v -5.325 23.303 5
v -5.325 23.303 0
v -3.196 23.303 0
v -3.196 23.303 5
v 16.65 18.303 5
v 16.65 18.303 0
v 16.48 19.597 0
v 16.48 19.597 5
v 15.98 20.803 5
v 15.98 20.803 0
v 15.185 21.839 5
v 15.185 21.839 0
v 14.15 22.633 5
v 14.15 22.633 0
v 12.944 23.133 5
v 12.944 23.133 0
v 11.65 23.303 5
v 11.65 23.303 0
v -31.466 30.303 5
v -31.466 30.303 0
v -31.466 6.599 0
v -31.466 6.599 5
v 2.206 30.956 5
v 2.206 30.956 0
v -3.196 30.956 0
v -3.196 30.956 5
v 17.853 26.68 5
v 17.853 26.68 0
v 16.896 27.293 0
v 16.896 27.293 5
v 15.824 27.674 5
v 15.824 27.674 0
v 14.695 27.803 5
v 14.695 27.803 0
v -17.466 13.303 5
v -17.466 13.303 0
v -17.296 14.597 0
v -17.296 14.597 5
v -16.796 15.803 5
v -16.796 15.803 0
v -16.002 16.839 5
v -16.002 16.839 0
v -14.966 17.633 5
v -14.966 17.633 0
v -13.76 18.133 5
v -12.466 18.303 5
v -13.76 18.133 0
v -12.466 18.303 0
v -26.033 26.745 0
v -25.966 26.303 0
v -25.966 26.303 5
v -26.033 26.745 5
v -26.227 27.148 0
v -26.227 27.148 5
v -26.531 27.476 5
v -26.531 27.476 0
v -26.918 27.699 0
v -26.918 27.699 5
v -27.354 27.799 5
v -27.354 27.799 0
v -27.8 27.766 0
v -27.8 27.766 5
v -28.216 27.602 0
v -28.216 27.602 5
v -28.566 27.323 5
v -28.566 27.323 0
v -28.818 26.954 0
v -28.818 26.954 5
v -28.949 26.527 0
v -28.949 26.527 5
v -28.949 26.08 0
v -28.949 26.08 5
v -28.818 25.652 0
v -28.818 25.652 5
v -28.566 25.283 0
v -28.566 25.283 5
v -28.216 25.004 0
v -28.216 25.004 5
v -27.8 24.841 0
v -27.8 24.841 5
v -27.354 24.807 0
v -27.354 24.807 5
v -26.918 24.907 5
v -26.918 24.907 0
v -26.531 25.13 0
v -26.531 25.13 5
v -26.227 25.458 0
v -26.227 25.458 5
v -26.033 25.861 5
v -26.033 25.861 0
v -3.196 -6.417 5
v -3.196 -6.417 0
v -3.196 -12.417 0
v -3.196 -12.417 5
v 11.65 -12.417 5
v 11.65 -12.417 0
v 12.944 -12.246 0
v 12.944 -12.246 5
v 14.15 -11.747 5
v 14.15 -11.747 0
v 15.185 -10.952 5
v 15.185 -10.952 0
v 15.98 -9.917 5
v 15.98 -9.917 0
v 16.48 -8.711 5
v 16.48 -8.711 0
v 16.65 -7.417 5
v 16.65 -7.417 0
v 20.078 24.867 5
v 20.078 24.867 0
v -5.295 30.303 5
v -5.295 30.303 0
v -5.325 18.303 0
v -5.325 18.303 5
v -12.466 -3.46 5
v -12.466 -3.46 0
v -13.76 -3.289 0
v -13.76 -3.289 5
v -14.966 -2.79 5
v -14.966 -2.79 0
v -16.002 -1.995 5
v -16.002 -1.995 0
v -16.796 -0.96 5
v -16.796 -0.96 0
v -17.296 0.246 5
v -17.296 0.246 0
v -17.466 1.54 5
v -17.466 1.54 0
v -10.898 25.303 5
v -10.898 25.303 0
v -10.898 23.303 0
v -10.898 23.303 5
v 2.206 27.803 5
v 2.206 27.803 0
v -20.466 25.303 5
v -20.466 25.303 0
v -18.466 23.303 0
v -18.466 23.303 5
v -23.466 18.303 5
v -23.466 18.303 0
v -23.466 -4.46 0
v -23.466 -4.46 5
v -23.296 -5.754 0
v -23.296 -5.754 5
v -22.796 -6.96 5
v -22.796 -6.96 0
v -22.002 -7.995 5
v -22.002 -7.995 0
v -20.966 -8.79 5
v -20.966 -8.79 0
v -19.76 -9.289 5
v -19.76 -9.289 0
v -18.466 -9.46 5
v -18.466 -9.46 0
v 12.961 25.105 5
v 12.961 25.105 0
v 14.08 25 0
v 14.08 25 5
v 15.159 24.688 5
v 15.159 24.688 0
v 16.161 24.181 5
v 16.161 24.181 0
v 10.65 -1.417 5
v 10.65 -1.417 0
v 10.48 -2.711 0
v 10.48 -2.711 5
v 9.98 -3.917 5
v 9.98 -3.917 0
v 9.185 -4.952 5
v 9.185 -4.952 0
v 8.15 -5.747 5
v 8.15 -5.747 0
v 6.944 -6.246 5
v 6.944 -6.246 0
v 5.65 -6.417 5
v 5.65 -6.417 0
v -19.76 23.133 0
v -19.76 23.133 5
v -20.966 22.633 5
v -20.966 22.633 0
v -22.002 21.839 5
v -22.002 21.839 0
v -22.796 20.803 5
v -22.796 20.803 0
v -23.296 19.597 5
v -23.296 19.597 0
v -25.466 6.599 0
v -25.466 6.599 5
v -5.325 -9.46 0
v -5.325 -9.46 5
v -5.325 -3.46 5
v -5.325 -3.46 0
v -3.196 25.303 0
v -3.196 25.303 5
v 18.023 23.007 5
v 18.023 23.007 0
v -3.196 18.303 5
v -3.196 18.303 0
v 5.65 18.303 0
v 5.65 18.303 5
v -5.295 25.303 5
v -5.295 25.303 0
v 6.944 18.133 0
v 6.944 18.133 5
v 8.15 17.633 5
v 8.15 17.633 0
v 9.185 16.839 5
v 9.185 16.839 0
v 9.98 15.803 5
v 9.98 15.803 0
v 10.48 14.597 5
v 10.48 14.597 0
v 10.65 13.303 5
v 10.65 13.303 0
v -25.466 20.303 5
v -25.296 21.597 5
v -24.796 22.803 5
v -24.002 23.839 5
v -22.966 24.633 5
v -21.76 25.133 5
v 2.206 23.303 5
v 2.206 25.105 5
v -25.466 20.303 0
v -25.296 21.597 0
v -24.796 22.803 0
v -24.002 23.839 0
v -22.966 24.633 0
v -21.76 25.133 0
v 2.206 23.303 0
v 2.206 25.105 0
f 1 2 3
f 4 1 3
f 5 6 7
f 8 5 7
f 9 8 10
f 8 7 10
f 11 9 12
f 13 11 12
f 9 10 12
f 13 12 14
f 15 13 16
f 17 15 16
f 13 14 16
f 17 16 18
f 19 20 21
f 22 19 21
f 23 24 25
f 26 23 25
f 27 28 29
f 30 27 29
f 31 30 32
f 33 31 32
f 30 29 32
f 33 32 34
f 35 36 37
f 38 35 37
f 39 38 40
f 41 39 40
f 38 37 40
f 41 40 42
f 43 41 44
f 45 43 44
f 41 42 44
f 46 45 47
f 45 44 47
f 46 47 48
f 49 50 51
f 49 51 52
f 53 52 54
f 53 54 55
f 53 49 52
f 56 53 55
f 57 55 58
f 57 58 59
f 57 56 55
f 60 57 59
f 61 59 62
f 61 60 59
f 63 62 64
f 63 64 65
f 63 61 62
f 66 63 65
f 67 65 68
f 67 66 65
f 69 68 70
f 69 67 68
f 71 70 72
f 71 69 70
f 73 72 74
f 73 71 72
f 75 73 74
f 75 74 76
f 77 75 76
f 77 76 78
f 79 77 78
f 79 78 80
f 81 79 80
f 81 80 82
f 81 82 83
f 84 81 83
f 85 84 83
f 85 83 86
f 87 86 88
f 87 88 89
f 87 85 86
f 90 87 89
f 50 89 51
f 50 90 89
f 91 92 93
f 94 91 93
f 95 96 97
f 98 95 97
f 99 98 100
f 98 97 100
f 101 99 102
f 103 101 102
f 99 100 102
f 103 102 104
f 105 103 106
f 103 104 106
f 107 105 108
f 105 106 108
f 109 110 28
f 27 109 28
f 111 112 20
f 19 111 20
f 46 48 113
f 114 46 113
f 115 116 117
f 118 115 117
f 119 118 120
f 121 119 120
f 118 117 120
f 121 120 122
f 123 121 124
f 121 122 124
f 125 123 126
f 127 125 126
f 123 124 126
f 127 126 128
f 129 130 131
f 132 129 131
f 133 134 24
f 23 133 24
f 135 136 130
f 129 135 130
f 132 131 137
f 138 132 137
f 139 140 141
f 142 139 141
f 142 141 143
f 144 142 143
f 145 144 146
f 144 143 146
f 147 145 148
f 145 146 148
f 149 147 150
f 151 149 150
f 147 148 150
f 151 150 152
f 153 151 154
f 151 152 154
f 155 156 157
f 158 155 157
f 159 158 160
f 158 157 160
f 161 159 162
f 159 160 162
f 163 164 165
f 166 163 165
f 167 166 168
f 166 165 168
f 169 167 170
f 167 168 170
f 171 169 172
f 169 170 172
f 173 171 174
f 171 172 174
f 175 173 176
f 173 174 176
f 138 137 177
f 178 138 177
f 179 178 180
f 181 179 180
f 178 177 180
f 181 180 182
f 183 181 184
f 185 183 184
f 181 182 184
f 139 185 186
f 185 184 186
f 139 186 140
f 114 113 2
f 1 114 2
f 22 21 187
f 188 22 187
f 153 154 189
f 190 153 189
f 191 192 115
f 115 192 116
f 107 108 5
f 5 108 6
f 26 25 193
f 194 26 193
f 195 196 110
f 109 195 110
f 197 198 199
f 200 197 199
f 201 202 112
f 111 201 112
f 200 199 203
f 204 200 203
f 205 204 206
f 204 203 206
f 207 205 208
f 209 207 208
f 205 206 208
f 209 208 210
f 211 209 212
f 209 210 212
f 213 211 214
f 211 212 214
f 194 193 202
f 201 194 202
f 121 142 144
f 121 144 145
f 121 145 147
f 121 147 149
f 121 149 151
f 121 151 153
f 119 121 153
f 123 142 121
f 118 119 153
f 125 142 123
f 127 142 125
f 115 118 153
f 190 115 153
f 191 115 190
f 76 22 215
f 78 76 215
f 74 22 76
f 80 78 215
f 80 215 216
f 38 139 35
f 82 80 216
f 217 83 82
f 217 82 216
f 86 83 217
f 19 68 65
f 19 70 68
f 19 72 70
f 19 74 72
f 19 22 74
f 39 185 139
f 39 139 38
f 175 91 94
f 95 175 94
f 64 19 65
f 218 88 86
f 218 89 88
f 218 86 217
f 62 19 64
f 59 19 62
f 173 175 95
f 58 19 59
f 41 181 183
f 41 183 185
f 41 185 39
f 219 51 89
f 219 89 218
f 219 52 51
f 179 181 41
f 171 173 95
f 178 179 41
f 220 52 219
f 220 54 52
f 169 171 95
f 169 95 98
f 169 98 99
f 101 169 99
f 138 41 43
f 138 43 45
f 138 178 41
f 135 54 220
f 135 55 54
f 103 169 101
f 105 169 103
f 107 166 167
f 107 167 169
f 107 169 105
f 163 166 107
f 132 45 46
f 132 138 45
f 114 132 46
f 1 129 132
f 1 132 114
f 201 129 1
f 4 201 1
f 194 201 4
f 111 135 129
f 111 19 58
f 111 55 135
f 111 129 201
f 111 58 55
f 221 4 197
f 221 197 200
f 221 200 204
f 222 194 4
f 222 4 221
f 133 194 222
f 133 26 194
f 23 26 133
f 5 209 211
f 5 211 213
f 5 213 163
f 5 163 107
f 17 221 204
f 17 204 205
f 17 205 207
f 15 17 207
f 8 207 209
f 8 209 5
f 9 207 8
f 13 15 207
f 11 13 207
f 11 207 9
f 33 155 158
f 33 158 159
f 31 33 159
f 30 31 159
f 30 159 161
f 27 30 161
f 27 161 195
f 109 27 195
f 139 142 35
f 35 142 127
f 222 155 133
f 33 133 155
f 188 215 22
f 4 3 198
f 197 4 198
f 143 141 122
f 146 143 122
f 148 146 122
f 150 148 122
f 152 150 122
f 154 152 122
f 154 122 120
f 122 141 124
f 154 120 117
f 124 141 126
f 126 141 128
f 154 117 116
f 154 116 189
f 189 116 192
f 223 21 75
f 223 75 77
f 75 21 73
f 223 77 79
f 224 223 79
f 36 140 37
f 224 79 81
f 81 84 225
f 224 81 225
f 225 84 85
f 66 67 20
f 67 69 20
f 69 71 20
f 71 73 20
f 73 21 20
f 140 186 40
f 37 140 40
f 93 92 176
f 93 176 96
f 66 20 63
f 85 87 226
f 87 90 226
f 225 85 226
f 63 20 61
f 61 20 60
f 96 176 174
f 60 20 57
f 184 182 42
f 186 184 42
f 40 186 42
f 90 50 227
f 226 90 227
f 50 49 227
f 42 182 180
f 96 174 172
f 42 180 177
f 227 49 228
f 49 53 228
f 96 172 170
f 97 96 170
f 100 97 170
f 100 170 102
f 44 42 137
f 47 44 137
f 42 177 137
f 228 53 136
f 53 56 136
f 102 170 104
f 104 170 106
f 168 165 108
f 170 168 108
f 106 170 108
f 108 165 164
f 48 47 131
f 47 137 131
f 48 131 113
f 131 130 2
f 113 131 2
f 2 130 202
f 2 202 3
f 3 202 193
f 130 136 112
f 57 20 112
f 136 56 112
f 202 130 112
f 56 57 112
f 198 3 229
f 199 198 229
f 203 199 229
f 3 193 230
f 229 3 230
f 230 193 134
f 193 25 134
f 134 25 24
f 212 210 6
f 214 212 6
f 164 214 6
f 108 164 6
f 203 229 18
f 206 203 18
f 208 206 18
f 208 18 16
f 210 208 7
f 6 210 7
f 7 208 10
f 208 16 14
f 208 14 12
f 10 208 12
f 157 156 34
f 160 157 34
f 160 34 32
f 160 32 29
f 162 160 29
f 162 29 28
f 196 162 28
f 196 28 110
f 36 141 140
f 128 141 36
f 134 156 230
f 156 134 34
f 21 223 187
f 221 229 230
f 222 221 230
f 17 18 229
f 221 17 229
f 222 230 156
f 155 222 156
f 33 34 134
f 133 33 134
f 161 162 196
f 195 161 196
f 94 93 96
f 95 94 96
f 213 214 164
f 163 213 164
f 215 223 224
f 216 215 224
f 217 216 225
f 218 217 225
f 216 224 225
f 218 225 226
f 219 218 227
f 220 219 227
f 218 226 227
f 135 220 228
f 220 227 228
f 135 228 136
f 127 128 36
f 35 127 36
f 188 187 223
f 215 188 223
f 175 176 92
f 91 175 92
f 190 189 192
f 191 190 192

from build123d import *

# Parameters (mm, degrees)
F0_R     = 1.5
F1_DEPTH = 5


with BuildPart() as f1:
    # F0 (on Top) → F1 (new body)
    with BuildSketch(Plane.XY):
        with BuildLine():
            Line((-20.466092, 25.303127), (-10.897727, 25.303127))
            Line((-10.897727, 25.303127), (-10.897727, 23.303127))
            Line((-10.897727, 23.303127), (-18.466092, 23.303127))
            ThreePointArc((-18.466092, 23.303127), (-22.001626, 21.838661), (-23.466092, 18.303127))
            Line((-23.466092, 18.303127), (-23.466092, 15.104749))
            Line((-23.466092, 15.104749), (-23.466092, 9.20962))
            Line((-23.466092, 9.20962), (-23.466092, -4.459552))
            ThreePointArc((-23.466092, -4.459552), (-22.001626, -7.995086), (-18.466092, -9.459552))
            Line((-18.466092, -9.459552), (-5.325101, -9.459552))
            Line((-5.325101, -9.459552), (-5.325101, -3.459552))
            Line((-5.325101, -3.459552), (-12.466092, -3.459552))
            ThreePointArc((-12.466092, -3.459552), (-16.001626, -1.995086), (-17.466092, 1.540448))
            Line((-17.466092, 1.540448), (-17.466092, 13.303127))
            ThreePointArc((-17.466092, 13.303127), (-16.001626, 16.838661), (-12.466092, 18.303127))
            Line((-12.466092, 18.303127), (-5.325101, 18.303127))
            Line((-5.325101, 18.303127), (-5.325101, 23.303127))
            Line((-5.325101, 23.303127), (-3.195953, 23.303127))
            Line((-3.195953, 23.303127), (-3.195953, 18.303127))
            Line((-3.195953, 18.303127), (2.206437, 18.303127))
            Line((2.206437, 18.303127), (5.649895, 18.303127))
            ThreePointArc((5.649895, 18.303127), (9.185429, 16.838661), (10.649895, 13.303127))
            Line((10.649895, 13.303127), (10.649895, -1.416758))
            ThreePointArc((10.649895, -1.416758), (9.185429, -4.952292), (5.649895, -6.416758))
            Line((5.649895, -6.416758), (-3.195953, -6.416758))
            Line((-3.195953, -6.416758), (-3.195953, -12.416758))
            Line((-3.195953, -12.416758), (10.649895, -12.416758))
            Line((10.649895, -12.416758), (11.649895, -12.416758))
            ThreePointArc((11.649895, -12.416758), (15.185429, -10.952292), (16.649895, -7.416758))
            Line((16.649895, -7.416758), (16.649895, 18.303127))
            ThreePointArc((16.649895, 18.303127), (15.185429, 21.838661), (11.649895, 23.303127))
            Line((11.649895, 23.303127), (2.206437, 23.303127))
            Line((2.206437, 23.303127), (2.206437, 25.10515))
            Line((2.206437, 25.10515), (12.961418, 25.10515))
            ThreePointArc((12.961418, 25.10515), (14.626748, 24.869409), (16.161216, 24.180709))
            Line((16.161216, 24.180709), (18.022634, 23.00721))
            Line((18.022634, 23.00721), (20.078026, 24.866851))
            Line((20.078026, 24.866851), (17.85285, 26.679604))
            ThreePointArc((17.85285, 26.679604), (16.370805, 27.51388), (14.694856, 27.803127))
            Line((14.694856, 27.803127), (2.206437, 27.803127))
            Line((2.206437, 27.803127), (2.206437, 30.955919))
            Line((2.206437, 30.955919), (-3.195953, 30.955919))
            Line((-3.195953, 30.955919), (-3.195953, 25.303127))
            Line((-3.195953, 25.303127), (-5.295211, 25.303127))
            Line((-5.295211, 25.303127), (-5.295211, 30.303127))
            Line((-5.295211, 30.303127), (-31.466092, 30.303127))
            Line((-31.466092, 30.303127), (-31.466092, 26.543299))
            Line((-31.466092, 26.543299), (-31.466092, 6.599163))
            Line((-31.466092, 6.599163), (-25.466092, 6.599163))
            Line((-25.466092, 6.599163), (-25.466092, 20.303127))
            ThreePointArc((-25.466092, 20.303127), (-24.001626, 23.838661), (-20.466092, 25.303127))
        make_face()
        with Locations((-27.466092, 26.303127)):
            Circle(F0_R, mode=Mode.SUBTRACT)
    extrude(amount=F1_DEPTH)


solid = f1.part
